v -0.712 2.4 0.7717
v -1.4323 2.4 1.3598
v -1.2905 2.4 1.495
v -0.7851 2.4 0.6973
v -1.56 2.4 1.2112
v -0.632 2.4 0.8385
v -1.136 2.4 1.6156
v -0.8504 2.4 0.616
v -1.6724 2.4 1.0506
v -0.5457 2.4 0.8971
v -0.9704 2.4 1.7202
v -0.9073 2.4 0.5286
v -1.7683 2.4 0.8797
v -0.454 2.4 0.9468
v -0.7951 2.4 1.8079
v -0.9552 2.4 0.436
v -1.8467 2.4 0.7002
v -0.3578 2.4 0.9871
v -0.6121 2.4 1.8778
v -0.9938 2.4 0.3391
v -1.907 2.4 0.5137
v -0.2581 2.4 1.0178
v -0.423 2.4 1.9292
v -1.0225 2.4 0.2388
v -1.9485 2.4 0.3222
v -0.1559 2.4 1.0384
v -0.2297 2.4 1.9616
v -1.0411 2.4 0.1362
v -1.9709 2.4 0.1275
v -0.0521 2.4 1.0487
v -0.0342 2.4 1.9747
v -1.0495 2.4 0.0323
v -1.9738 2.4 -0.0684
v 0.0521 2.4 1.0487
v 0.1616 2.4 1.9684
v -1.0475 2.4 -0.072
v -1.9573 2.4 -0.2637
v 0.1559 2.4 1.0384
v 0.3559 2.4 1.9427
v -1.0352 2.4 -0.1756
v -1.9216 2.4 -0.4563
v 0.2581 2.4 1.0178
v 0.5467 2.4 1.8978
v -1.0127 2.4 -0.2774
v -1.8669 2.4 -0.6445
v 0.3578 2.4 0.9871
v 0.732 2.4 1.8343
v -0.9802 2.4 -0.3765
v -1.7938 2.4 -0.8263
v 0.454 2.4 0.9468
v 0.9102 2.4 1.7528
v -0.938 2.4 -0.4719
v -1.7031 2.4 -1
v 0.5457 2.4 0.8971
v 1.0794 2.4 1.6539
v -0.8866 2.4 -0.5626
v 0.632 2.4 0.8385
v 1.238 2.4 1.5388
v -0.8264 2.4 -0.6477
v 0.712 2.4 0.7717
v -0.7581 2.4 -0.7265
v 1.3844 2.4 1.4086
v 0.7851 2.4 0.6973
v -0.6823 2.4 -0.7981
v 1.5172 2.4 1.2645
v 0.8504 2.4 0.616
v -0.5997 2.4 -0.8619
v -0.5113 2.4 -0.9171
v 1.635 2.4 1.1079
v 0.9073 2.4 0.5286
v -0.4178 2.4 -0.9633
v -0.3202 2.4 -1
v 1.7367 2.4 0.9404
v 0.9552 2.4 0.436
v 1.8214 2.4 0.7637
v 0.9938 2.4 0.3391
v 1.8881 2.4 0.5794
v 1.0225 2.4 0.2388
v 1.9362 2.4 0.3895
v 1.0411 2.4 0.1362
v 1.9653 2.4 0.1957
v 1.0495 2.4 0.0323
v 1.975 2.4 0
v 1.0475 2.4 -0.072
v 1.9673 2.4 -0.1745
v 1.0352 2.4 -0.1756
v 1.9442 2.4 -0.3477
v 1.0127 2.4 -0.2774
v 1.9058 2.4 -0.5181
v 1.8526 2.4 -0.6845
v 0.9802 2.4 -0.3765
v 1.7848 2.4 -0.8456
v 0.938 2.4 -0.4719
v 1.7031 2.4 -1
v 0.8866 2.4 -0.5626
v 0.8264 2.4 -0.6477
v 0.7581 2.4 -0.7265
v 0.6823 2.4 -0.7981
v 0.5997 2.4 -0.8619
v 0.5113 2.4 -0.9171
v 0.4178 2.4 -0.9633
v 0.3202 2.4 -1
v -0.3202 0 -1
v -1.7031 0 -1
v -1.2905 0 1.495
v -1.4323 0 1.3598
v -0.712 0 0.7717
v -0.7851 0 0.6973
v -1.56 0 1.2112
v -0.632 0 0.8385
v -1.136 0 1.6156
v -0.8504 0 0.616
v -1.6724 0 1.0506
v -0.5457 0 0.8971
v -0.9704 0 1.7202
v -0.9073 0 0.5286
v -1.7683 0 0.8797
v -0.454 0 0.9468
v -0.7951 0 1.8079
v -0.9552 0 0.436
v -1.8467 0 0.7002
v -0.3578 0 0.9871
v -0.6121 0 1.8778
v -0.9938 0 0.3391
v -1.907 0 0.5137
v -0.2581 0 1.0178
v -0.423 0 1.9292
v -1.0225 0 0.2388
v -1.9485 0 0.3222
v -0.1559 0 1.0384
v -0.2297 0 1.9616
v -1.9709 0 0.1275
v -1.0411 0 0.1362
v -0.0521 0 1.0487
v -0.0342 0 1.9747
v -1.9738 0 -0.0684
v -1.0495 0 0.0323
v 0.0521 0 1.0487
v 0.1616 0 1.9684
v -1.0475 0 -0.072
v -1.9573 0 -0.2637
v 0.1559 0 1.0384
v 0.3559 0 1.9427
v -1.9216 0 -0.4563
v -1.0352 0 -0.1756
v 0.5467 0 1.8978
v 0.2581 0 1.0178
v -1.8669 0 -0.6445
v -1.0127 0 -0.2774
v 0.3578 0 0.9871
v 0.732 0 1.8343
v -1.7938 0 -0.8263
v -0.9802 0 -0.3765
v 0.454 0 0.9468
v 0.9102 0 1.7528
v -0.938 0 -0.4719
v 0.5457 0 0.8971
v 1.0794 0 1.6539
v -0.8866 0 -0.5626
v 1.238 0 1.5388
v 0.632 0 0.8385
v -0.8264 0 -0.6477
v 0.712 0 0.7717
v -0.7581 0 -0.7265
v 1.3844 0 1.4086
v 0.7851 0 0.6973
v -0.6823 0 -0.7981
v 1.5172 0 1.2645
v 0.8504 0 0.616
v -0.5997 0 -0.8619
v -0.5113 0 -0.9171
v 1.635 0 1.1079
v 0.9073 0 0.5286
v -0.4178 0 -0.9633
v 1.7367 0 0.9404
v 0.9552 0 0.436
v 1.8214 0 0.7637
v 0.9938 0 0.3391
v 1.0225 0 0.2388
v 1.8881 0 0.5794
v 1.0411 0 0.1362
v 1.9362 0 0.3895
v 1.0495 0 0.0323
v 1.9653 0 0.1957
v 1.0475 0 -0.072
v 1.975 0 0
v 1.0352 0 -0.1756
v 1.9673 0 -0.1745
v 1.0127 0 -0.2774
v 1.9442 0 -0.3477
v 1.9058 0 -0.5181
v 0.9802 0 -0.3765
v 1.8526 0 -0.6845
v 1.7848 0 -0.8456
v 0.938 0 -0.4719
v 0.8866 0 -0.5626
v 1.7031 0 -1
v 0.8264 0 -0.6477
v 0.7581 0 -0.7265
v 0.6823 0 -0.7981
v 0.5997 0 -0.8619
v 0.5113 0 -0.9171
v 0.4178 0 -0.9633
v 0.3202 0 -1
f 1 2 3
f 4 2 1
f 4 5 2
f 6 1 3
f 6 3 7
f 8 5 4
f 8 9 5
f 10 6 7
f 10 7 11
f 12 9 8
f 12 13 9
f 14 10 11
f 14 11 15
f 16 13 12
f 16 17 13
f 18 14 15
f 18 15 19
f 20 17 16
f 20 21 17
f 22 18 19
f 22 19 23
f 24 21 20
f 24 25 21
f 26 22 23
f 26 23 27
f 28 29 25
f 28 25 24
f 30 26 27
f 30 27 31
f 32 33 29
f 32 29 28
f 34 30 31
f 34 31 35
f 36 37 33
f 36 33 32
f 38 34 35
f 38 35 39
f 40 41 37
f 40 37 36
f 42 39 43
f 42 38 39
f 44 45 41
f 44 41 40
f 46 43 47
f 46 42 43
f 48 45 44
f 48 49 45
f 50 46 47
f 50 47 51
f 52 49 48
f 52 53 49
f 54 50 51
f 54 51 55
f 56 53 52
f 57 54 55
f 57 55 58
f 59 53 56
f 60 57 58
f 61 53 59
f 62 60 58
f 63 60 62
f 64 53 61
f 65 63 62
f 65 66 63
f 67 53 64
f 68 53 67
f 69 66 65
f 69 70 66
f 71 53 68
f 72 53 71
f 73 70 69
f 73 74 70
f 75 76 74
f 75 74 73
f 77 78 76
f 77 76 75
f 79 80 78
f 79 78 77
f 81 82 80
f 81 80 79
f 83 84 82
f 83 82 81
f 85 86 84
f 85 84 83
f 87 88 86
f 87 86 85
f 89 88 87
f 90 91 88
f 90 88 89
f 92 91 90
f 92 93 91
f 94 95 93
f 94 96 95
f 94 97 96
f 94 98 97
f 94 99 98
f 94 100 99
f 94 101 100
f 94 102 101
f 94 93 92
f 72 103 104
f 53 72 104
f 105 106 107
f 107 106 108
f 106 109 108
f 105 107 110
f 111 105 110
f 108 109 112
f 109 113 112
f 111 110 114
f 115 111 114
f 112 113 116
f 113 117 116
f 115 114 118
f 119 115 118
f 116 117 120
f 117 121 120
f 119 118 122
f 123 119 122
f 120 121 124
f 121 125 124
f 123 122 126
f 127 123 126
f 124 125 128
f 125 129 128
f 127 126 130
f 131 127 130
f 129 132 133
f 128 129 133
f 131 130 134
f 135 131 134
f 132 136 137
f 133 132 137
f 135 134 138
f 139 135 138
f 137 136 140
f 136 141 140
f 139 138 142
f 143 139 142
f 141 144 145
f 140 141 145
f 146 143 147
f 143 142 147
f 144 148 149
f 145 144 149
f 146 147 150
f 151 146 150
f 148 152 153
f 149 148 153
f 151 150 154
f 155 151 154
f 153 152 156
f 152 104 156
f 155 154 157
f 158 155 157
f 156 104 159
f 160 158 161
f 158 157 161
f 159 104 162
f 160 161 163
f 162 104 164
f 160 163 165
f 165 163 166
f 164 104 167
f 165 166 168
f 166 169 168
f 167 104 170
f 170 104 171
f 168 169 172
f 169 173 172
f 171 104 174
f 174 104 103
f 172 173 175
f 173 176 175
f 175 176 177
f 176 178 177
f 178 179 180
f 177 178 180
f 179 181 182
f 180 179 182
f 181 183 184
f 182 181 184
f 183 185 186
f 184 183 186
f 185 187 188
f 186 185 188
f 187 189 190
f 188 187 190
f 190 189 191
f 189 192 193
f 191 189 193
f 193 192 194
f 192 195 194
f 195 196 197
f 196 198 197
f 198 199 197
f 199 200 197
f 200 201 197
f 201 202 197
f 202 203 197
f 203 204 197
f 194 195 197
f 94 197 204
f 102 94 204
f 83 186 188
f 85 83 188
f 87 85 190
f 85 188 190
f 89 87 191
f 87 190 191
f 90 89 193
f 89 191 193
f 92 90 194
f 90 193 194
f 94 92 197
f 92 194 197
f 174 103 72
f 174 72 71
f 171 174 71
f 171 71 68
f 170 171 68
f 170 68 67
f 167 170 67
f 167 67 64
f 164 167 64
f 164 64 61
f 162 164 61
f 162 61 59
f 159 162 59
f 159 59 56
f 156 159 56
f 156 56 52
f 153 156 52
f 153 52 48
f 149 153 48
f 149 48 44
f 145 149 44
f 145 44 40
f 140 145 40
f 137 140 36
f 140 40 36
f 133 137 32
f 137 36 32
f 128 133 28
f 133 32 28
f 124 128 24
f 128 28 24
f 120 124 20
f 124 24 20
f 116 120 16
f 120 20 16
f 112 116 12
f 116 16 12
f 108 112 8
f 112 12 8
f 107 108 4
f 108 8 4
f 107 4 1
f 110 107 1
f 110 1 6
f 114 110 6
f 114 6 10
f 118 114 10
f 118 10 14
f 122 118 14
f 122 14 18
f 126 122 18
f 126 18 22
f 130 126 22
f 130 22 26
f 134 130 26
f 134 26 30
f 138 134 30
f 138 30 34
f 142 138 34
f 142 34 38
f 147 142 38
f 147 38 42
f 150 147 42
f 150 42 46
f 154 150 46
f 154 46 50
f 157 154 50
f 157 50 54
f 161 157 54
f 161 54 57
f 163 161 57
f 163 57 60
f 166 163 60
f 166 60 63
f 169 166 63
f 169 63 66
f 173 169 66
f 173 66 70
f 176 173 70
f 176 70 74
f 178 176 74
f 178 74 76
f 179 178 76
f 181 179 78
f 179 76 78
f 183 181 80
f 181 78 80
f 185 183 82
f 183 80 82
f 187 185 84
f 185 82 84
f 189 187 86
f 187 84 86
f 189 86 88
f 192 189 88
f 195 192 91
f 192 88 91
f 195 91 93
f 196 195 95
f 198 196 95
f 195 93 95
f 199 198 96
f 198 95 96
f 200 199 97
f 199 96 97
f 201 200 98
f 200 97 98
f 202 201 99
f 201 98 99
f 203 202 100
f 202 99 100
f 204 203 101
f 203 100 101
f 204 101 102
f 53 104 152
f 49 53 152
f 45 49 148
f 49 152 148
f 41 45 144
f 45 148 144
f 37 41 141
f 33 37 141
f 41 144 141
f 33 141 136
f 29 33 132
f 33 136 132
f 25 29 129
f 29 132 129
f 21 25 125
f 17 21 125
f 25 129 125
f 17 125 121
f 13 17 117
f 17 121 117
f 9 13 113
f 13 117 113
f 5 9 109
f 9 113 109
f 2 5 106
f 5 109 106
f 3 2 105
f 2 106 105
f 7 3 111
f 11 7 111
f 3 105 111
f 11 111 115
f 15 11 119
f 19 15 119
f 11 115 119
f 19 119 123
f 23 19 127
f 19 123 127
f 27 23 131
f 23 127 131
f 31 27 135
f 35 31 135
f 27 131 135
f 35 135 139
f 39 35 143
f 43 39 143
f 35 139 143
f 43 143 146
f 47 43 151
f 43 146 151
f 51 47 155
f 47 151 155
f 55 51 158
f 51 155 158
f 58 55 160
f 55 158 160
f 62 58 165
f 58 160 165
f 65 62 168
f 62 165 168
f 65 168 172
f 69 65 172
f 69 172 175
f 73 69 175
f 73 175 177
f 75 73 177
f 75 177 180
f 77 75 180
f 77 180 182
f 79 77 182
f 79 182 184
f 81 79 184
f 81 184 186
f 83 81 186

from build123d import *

# Parameters (mm, degrees)
BOSS_EXTRUDE1_DEPTH = 2.4
SKETCH2_R           = 1.05
CUT_EXTRUDE1_DEPTH  = 4.682560251


with BuildPart() as part:
    # Sketch1 → Boss-Extrude1 (new body)
    with BuildSketch(Plane(origin=(0, 0, 0), x_dir=(1, 0, 0), z_dir=(0, 1, 0))):
        with BuildLine():
            Line((1.703122133, 1), (-1.703122133, 1))
            ThreePointArc((-1.703122133, 1), (-0.518149972, -1.905818881), (1.975, 0))
            ThreePointArc((1.975, 0), (1.905818881, 0.518149972), (1.703122133, 1))
        make_face()
    extrude(amount=BOSS_EXTRUDE1_DEPTH)

    # Sketch2 → Cut-Extrude1 (cut, through all)
    with BuildSketch(Plane(origin=(0, 2.4, 0), x_dir=(1, 0, 0), z_dir=(0, 1, 0))):
        Circle(SKETCH2_R)
    extrude(amount=-CUT_EXTRUDE1_DEPTH, mode=Mode.SUBTRACT)


solid = part.part
